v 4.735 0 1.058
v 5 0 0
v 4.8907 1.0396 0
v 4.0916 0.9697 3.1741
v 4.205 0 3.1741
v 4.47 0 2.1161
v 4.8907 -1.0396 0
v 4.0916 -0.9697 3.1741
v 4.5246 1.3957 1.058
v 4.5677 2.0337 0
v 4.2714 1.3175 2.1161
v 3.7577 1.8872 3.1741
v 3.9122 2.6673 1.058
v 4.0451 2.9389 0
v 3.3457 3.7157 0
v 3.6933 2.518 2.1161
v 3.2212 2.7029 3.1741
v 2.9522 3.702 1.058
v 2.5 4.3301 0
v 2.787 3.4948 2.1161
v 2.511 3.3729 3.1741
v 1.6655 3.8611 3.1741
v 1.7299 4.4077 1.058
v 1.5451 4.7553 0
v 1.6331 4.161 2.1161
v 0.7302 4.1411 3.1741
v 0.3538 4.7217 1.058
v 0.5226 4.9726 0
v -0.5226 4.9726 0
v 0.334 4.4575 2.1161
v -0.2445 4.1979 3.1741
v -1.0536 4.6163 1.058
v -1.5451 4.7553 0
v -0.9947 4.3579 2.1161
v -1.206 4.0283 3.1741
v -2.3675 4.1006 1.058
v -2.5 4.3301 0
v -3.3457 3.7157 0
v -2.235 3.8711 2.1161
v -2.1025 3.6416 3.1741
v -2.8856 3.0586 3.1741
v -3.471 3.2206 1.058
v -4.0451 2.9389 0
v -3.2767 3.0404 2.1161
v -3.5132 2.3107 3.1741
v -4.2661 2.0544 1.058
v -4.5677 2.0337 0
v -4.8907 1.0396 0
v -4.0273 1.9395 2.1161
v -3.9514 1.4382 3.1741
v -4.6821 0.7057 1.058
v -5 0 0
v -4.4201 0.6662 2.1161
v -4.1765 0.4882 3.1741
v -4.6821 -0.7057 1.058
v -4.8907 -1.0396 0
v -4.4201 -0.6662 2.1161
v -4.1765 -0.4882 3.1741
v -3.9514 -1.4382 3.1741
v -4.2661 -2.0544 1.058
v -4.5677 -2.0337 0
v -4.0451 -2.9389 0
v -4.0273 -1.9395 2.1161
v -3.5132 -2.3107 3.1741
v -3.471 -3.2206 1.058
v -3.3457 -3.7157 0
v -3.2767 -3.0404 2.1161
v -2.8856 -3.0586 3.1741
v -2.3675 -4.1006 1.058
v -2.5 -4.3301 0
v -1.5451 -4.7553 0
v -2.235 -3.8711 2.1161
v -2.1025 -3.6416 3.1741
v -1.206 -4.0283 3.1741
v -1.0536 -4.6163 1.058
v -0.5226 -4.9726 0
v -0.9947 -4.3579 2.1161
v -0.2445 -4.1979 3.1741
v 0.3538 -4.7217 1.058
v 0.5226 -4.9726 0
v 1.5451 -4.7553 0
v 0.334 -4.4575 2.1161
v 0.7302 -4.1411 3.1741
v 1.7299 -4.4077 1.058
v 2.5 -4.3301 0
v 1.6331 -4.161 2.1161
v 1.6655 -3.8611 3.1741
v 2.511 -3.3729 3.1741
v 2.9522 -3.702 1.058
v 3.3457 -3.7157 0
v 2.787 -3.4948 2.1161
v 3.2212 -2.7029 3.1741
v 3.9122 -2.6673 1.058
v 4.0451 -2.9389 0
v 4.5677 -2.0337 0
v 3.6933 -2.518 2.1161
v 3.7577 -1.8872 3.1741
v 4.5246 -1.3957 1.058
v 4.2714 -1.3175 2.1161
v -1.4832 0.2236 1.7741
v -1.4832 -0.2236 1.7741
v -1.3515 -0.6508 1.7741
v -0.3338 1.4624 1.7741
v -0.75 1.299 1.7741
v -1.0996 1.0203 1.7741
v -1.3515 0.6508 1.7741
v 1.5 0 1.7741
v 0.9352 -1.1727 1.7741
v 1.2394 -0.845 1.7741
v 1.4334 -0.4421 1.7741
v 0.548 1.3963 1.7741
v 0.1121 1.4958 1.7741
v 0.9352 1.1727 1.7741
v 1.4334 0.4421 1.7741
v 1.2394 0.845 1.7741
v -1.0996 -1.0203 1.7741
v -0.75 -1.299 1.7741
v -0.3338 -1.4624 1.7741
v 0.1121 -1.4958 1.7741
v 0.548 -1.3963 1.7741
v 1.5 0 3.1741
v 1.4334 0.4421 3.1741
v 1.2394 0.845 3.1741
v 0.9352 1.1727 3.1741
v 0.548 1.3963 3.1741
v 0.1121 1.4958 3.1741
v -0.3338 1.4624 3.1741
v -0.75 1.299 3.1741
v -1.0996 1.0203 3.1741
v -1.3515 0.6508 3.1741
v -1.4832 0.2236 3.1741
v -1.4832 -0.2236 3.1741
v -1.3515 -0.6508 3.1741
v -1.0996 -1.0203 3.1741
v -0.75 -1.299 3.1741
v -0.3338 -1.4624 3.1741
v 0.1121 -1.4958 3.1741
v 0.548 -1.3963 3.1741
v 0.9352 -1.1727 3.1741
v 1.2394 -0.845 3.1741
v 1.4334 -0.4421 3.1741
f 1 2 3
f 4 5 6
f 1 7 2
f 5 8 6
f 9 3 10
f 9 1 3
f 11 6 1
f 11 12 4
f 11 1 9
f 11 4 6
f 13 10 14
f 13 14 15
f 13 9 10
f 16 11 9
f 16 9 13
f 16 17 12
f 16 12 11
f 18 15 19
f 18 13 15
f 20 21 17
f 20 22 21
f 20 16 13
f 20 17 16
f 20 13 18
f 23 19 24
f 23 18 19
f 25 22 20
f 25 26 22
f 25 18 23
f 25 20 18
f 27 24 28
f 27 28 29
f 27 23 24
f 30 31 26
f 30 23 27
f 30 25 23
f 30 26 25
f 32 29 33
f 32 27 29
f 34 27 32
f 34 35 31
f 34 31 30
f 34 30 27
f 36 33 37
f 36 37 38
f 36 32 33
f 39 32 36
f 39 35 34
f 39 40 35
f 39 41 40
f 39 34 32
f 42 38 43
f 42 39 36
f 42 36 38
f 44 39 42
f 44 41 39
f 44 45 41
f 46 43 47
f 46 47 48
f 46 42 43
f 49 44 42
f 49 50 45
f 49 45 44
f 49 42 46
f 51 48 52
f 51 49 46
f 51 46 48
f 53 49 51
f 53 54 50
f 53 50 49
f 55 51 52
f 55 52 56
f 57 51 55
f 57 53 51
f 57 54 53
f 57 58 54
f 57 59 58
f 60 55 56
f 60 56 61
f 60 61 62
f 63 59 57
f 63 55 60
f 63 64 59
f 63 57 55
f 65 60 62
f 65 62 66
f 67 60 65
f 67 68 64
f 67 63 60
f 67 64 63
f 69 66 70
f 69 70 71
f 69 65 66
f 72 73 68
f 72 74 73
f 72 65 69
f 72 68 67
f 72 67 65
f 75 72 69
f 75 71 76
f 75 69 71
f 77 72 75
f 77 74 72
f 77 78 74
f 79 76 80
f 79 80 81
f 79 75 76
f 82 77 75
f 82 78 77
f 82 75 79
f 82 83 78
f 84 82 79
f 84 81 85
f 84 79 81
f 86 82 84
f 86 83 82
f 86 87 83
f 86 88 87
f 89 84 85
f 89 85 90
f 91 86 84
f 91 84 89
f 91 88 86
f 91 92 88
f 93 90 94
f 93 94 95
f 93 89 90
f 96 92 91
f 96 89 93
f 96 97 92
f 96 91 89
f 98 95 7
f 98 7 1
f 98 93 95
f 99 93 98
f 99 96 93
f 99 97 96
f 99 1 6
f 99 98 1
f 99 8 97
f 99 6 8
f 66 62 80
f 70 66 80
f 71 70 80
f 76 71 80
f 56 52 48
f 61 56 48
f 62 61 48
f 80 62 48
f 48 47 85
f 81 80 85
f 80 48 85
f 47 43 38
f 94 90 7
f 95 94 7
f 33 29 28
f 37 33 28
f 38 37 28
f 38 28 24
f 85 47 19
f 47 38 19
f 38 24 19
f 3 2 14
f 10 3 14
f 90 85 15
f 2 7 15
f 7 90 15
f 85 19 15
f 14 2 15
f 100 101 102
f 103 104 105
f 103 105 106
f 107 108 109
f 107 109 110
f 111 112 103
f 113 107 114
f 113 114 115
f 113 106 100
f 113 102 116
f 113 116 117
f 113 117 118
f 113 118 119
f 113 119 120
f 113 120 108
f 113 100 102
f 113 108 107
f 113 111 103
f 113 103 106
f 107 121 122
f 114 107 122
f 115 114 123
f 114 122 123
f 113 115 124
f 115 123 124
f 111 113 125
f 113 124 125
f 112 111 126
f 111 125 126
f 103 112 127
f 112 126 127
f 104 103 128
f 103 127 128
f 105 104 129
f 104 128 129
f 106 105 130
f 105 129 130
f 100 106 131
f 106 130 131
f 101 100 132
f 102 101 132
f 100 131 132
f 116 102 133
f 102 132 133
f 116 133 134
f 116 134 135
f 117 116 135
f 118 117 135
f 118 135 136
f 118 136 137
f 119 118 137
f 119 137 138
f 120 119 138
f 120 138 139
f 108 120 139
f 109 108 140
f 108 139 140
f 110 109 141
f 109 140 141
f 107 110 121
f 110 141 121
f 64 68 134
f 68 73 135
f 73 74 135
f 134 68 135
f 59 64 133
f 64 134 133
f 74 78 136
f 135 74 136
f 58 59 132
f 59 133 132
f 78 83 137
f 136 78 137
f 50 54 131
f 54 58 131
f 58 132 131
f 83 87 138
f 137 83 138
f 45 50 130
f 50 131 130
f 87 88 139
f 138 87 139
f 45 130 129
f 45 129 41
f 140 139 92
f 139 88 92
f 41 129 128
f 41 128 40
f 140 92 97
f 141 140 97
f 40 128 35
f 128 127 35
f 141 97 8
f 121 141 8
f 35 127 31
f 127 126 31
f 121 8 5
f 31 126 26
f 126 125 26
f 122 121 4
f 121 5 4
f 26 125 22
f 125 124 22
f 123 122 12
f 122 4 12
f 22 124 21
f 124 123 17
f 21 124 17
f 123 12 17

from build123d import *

# Parameters (mm, degrees)
F0_R     = 5
F3_W     = 26.240948
F3_H     = 20
F4_DEPTH = 12.5
F5_R     = 1.5
F6_DEPTH = 1.4


with BuildPart() as f2:
    # F0 (on Top) → F2 section 0
    with BuildSketch(Plane.XY, mode=Mode.PRIVATE) as f2_s0:
        Circle(F0_R)
    loft([f2_s0.sketch, Vertex(0, 0, 19.961977)])

    # F3 (on Right) → F4 (cut, symmetric)
    with BuildSketch(Plane.YZ):
        with Locations((0, 13.174092)):
            Rectangle(F3_W, F3_H)
    extrude(amount=F4_DEPTH, both=True, mode=Mode.SUBTRACT)

    # F5 (on face) → F6 (cut)
    with BuildSketch(Plane.XY.offset(3.174092)):
        Circle(F5_R)
    extrude(amount=-F6_DEPTH, mode=Mode.SUBTRACT)


solid = f2.part
